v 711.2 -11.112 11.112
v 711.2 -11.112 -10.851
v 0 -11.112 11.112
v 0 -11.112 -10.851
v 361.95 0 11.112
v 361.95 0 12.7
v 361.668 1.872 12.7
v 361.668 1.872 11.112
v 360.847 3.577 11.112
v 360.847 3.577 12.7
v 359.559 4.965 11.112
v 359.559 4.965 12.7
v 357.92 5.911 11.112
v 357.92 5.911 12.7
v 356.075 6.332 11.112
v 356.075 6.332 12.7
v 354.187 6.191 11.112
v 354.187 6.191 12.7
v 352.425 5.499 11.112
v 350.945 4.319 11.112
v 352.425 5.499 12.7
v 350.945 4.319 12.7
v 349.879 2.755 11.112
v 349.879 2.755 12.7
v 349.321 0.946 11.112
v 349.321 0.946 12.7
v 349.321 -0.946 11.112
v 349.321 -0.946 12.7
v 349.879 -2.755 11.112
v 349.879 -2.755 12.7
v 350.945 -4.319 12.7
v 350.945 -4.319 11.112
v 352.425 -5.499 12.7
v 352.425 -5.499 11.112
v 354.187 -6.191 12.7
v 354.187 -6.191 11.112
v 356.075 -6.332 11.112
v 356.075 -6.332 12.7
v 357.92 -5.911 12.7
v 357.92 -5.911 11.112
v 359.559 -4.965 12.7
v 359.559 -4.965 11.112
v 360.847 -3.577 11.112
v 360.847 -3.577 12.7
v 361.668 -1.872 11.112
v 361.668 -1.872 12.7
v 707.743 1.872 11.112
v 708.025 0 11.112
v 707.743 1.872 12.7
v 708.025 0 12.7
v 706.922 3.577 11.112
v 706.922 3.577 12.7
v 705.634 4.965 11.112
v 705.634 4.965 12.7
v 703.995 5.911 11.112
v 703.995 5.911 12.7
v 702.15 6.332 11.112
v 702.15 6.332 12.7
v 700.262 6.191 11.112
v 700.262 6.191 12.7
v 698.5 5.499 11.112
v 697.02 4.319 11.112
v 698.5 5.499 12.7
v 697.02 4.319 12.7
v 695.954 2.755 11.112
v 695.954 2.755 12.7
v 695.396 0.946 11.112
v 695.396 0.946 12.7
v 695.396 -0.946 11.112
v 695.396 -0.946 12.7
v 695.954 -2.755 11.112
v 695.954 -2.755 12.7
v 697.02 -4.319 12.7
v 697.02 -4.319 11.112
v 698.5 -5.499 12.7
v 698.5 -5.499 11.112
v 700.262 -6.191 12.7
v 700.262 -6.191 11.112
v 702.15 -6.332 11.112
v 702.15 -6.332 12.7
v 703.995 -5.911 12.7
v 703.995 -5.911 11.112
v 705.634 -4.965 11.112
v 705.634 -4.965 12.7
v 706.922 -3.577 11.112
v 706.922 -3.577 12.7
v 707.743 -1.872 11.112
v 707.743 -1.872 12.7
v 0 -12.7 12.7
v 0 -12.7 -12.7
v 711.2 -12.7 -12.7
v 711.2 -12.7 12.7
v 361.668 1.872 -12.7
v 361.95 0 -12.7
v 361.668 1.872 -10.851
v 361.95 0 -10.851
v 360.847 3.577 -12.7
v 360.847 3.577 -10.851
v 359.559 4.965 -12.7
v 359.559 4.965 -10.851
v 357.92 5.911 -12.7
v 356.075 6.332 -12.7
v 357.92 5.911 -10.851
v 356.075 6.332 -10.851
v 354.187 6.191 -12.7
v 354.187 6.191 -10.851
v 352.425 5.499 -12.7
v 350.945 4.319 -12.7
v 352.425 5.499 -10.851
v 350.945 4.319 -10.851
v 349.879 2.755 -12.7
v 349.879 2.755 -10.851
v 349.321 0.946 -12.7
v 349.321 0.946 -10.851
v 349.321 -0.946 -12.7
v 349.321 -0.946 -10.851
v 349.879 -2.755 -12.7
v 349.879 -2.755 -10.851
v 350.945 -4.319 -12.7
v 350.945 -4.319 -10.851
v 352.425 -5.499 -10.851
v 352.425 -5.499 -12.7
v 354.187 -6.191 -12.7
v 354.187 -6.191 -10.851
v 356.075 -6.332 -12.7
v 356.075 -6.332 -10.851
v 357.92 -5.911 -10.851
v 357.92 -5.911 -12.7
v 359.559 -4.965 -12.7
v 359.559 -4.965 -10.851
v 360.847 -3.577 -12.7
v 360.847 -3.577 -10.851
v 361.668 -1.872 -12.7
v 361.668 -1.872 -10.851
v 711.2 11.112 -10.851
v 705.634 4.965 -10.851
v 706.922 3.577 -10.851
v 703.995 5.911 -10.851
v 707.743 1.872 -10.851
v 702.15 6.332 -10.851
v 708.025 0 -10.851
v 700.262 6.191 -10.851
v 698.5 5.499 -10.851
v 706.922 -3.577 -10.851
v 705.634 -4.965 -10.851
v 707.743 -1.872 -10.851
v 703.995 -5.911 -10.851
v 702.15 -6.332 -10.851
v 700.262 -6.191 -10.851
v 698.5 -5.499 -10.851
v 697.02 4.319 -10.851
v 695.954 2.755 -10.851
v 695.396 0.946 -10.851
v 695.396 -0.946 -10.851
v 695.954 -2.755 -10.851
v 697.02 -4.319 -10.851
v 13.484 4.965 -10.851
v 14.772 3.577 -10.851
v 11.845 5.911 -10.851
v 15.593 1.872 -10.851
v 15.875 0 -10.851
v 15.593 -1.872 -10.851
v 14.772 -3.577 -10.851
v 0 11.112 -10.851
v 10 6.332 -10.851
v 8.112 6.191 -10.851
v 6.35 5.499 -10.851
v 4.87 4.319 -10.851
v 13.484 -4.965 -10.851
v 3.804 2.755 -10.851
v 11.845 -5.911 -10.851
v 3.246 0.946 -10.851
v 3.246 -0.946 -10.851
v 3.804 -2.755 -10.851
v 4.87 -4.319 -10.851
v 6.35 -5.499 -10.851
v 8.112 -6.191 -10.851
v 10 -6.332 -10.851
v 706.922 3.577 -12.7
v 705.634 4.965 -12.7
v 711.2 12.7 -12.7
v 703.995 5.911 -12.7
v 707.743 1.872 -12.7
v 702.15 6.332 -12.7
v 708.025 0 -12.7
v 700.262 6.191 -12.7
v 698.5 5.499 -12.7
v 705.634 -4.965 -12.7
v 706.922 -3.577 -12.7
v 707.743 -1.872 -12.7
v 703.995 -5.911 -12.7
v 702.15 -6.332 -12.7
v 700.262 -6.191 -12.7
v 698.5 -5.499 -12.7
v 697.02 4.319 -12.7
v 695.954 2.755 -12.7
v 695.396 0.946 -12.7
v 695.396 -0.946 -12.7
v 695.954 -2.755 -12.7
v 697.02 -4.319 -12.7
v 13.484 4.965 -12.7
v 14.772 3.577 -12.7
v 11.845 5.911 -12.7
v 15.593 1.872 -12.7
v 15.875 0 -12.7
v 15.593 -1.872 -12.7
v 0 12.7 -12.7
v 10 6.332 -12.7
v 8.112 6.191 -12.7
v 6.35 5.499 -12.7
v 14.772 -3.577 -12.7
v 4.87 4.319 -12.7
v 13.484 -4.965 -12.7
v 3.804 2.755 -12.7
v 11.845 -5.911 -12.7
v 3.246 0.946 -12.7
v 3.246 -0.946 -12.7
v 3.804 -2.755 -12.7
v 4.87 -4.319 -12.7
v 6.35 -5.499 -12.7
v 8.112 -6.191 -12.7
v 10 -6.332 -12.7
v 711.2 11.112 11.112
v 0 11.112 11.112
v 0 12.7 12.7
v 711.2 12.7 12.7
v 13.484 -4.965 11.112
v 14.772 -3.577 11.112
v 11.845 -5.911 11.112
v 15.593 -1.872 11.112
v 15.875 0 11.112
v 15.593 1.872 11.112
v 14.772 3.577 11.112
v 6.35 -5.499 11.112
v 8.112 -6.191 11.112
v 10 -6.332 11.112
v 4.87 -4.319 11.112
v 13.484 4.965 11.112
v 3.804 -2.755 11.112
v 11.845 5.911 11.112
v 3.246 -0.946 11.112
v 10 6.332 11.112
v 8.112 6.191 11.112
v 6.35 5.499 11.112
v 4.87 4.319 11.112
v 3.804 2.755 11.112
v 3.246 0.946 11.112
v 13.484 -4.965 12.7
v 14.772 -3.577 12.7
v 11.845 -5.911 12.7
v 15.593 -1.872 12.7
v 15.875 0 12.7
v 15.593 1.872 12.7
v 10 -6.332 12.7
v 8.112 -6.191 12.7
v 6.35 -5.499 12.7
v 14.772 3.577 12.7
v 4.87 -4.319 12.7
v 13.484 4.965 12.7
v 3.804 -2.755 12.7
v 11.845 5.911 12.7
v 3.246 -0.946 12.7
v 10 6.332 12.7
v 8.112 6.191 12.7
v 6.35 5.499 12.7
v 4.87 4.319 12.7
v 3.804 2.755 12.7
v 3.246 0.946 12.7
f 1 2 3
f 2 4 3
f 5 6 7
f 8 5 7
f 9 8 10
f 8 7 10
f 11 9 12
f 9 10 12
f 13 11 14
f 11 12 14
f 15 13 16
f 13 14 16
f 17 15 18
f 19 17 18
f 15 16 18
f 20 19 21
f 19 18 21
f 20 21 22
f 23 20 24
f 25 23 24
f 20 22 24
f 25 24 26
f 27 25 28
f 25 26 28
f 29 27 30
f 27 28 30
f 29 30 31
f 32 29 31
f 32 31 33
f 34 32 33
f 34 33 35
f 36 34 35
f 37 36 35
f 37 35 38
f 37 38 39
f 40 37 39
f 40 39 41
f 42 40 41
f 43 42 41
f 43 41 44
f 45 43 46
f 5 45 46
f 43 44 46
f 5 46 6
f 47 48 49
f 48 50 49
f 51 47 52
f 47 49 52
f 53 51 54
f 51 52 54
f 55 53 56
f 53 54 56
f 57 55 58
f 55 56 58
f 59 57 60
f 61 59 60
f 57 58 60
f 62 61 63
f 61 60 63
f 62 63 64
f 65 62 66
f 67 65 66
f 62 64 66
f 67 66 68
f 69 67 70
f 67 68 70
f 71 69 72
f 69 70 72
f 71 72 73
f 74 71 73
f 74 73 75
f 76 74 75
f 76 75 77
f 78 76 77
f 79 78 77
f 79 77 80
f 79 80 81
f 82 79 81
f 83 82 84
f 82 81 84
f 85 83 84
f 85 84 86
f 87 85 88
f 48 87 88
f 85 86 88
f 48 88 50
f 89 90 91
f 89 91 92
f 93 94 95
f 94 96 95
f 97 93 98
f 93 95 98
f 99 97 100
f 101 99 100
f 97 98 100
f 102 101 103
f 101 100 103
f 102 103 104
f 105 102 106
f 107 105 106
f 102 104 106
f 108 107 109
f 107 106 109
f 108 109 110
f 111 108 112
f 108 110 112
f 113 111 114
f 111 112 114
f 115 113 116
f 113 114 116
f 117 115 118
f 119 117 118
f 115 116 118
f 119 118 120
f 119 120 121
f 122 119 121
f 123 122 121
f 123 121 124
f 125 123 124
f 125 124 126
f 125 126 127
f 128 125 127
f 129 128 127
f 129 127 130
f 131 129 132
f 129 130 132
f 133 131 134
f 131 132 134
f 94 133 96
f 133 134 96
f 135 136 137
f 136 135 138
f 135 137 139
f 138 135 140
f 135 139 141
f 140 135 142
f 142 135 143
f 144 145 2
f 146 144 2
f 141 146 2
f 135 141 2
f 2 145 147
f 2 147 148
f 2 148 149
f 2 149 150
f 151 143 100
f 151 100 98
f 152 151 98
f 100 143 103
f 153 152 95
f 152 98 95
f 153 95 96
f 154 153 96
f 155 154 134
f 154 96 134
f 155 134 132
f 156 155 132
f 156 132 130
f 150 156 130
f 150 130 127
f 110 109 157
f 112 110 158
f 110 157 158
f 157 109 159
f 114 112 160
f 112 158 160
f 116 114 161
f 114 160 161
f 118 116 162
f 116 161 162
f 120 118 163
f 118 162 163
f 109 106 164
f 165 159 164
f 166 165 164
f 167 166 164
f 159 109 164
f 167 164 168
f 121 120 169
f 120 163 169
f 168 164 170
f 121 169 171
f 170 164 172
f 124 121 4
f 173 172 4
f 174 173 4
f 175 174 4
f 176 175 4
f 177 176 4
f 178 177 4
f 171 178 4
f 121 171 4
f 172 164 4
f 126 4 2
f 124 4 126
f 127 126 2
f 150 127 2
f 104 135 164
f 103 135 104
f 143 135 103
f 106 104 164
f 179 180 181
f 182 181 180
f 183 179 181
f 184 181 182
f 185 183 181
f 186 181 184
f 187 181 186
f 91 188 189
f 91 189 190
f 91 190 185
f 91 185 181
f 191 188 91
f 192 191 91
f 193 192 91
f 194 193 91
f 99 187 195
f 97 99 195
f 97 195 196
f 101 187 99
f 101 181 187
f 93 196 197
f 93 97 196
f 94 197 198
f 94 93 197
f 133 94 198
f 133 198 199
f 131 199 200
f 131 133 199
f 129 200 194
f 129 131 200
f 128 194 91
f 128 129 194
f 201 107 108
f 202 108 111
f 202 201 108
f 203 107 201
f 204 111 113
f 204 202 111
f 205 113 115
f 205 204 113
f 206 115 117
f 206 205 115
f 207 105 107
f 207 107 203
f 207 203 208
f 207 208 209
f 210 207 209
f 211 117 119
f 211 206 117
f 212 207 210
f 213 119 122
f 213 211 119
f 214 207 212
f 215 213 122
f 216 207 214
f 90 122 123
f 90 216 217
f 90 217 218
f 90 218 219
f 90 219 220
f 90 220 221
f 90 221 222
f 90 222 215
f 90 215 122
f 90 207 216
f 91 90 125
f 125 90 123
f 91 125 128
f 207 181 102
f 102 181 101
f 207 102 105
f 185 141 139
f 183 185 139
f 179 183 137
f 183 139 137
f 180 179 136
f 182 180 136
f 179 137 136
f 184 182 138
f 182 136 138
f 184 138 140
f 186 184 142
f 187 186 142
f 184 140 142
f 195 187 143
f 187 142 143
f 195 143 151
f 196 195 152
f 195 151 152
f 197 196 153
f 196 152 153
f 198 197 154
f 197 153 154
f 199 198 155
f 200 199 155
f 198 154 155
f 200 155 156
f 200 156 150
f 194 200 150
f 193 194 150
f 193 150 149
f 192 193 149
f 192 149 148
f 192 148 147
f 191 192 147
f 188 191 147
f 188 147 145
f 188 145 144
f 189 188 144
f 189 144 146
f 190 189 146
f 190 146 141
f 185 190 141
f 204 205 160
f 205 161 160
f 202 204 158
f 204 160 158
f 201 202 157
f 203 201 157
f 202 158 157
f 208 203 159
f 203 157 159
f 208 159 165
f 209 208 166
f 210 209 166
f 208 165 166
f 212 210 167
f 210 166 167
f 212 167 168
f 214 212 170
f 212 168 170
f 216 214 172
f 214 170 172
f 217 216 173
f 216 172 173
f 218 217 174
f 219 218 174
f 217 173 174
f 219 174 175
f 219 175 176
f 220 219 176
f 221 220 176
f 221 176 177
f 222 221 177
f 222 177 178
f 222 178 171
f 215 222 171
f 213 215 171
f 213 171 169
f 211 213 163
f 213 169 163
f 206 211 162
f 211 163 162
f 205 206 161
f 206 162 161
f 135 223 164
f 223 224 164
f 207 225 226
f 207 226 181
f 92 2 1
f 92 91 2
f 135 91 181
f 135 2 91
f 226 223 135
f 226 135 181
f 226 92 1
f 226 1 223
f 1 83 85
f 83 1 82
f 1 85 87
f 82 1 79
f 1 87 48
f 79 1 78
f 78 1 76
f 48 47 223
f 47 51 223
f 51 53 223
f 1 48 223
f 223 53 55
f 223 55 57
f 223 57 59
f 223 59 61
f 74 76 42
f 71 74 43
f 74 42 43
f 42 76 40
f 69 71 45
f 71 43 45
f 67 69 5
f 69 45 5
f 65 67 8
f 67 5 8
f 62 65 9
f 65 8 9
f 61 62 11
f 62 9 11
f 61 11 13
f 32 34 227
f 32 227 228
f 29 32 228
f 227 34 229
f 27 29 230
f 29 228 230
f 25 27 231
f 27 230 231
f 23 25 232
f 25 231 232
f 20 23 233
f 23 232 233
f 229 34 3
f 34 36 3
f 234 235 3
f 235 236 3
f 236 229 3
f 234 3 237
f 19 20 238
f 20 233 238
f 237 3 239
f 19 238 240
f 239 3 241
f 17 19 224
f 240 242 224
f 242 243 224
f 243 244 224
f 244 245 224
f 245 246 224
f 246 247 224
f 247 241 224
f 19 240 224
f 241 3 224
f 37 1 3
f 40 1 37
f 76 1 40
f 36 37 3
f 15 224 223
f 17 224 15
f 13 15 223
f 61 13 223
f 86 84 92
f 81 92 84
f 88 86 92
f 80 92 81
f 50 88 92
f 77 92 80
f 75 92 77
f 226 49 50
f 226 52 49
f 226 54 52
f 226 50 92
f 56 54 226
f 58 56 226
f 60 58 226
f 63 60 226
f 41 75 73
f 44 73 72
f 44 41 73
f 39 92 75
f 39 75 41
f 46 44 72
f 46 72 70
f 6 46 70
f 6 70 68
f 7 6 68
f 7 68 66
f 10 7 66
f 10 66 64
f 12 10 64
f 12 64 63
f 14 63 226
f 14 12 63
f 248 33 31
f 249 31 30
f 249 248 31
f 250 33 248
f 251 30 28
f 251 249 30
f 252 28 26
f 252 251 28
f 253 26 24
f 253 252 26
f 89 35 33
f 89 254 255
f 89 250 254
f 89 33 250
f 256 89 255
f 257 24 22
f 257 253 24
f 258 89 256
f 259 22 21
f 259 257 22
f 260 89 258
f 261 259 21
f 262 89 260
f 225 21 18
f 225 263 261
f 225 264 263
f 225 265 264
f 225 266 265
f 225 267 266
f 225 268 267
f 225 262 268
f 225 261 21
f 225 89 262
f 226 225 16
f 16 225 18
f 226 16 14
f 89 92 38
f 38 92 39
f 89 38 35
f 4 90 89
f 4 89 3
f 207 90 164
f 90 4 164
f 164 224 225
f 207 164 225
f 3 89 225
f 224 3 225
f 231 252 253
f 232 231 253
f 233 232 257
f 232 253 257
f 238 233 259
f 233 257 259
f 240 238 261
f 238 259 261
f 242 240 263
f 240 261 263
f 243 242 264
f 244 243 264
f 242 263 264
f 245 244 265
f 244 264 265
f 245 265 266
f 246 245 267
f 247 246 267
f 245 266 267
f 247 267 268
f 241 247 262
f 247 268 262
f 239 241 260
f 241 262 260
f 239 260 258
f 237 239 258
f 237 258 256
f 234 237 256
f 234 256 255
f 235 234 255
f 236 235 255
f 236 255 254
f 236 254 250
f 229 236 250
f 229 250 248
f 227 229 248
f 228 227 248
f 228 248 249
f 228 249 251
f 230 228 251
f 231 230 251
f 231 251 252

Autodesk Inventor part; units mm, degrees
ref_plane "YZ Plane" through (0, 0, 0) normal (1, 0, 0) x (0, 1, 0)
ref_plane "XZ Plane" through (0, 0, 0) normal (0, 1, 0) x (-1, 0, 0)
ref_plane "XY Plane" through (0, 0, 0) normal (0, 0, 1) x (1, 0, 0)
sketch "Sketch1" plane through (0, 0, 0) normal (1, 0, 0) x (0, 1, 0)
  line L0 (-12.7, 12.7) -> (12.7, 12.7)
  line L1 (12.7, 12.7) -> (12.7, -12.7)
  line L2 (12.7, -12.7) -> (-12.7, -12.7)
  line L3 (-12.7, -12.7) -> (-12.7, 12.7)
  line L4 (-11.1125, 11.1125) -> (11.1125, 11.1125)
  line L5 (11.1125, 11.1125) -> (11.1125, -10.8514)
  line L6 (11.1125, -10.8514) -> (-11.1125, -10.8514)
  line L7 (-11.1125, -10.8514) -> (-11.1125, 11.1125)
  point P0 (0, 0)
  point P1 (0, 12.7)
  point P2 (-12.7, 0)
  dimension "d0" = 25.4
  dimension "d1" = 25.4
  dimension "d2" = 1.5875
  dimension "d3" = 1.5875
  dimension "d4" = 1.5875
extrude "Extrusion1" add sketch "Sketch1" along normal blind 711.2
sketch "Sketch2" plane through (0, -12.7, 12.7) normal (0, 0, 1) x (1, 0, 0)
  circle A0 centre (9.525, 12.7) radius 6.35
  circle A1 centre (701.675, 12.7) radius 6.35
  line L0 (711.2, 25.4) -> (711.2, 0) projected
  circle A2 centre (355.6, 12.7) radius 6.35
  line L1 (0, 0) -> (0, 25.4) projected
  line L2 (0, 0) -> (711.2, 0) projected
  point P0 (0, 12.7)
  point P1 (393.7, 0)
  point P2 (355.6, 0)
  point P3 (0, 12.7)
  dimension "d7" = 12.7
  dimension "d8" = 9.525
  dimension "d9" = 12.7
  dimension "d10" = 9.525
  dimension "d13" = 12.7
  dimension "d19" = 711.2
extrude "Extrusion4" cut sketch "Sketch2" against normal blind 25.4
equation "\"d1\" = d0"
equation "\"d3\" = d2"
equation "\"d4\" = d2"
equation "\"d9\" = d7"
equation "\"d10\" = d8"
equation "\"d13\" = d7"
properties part number "Long Bar"
